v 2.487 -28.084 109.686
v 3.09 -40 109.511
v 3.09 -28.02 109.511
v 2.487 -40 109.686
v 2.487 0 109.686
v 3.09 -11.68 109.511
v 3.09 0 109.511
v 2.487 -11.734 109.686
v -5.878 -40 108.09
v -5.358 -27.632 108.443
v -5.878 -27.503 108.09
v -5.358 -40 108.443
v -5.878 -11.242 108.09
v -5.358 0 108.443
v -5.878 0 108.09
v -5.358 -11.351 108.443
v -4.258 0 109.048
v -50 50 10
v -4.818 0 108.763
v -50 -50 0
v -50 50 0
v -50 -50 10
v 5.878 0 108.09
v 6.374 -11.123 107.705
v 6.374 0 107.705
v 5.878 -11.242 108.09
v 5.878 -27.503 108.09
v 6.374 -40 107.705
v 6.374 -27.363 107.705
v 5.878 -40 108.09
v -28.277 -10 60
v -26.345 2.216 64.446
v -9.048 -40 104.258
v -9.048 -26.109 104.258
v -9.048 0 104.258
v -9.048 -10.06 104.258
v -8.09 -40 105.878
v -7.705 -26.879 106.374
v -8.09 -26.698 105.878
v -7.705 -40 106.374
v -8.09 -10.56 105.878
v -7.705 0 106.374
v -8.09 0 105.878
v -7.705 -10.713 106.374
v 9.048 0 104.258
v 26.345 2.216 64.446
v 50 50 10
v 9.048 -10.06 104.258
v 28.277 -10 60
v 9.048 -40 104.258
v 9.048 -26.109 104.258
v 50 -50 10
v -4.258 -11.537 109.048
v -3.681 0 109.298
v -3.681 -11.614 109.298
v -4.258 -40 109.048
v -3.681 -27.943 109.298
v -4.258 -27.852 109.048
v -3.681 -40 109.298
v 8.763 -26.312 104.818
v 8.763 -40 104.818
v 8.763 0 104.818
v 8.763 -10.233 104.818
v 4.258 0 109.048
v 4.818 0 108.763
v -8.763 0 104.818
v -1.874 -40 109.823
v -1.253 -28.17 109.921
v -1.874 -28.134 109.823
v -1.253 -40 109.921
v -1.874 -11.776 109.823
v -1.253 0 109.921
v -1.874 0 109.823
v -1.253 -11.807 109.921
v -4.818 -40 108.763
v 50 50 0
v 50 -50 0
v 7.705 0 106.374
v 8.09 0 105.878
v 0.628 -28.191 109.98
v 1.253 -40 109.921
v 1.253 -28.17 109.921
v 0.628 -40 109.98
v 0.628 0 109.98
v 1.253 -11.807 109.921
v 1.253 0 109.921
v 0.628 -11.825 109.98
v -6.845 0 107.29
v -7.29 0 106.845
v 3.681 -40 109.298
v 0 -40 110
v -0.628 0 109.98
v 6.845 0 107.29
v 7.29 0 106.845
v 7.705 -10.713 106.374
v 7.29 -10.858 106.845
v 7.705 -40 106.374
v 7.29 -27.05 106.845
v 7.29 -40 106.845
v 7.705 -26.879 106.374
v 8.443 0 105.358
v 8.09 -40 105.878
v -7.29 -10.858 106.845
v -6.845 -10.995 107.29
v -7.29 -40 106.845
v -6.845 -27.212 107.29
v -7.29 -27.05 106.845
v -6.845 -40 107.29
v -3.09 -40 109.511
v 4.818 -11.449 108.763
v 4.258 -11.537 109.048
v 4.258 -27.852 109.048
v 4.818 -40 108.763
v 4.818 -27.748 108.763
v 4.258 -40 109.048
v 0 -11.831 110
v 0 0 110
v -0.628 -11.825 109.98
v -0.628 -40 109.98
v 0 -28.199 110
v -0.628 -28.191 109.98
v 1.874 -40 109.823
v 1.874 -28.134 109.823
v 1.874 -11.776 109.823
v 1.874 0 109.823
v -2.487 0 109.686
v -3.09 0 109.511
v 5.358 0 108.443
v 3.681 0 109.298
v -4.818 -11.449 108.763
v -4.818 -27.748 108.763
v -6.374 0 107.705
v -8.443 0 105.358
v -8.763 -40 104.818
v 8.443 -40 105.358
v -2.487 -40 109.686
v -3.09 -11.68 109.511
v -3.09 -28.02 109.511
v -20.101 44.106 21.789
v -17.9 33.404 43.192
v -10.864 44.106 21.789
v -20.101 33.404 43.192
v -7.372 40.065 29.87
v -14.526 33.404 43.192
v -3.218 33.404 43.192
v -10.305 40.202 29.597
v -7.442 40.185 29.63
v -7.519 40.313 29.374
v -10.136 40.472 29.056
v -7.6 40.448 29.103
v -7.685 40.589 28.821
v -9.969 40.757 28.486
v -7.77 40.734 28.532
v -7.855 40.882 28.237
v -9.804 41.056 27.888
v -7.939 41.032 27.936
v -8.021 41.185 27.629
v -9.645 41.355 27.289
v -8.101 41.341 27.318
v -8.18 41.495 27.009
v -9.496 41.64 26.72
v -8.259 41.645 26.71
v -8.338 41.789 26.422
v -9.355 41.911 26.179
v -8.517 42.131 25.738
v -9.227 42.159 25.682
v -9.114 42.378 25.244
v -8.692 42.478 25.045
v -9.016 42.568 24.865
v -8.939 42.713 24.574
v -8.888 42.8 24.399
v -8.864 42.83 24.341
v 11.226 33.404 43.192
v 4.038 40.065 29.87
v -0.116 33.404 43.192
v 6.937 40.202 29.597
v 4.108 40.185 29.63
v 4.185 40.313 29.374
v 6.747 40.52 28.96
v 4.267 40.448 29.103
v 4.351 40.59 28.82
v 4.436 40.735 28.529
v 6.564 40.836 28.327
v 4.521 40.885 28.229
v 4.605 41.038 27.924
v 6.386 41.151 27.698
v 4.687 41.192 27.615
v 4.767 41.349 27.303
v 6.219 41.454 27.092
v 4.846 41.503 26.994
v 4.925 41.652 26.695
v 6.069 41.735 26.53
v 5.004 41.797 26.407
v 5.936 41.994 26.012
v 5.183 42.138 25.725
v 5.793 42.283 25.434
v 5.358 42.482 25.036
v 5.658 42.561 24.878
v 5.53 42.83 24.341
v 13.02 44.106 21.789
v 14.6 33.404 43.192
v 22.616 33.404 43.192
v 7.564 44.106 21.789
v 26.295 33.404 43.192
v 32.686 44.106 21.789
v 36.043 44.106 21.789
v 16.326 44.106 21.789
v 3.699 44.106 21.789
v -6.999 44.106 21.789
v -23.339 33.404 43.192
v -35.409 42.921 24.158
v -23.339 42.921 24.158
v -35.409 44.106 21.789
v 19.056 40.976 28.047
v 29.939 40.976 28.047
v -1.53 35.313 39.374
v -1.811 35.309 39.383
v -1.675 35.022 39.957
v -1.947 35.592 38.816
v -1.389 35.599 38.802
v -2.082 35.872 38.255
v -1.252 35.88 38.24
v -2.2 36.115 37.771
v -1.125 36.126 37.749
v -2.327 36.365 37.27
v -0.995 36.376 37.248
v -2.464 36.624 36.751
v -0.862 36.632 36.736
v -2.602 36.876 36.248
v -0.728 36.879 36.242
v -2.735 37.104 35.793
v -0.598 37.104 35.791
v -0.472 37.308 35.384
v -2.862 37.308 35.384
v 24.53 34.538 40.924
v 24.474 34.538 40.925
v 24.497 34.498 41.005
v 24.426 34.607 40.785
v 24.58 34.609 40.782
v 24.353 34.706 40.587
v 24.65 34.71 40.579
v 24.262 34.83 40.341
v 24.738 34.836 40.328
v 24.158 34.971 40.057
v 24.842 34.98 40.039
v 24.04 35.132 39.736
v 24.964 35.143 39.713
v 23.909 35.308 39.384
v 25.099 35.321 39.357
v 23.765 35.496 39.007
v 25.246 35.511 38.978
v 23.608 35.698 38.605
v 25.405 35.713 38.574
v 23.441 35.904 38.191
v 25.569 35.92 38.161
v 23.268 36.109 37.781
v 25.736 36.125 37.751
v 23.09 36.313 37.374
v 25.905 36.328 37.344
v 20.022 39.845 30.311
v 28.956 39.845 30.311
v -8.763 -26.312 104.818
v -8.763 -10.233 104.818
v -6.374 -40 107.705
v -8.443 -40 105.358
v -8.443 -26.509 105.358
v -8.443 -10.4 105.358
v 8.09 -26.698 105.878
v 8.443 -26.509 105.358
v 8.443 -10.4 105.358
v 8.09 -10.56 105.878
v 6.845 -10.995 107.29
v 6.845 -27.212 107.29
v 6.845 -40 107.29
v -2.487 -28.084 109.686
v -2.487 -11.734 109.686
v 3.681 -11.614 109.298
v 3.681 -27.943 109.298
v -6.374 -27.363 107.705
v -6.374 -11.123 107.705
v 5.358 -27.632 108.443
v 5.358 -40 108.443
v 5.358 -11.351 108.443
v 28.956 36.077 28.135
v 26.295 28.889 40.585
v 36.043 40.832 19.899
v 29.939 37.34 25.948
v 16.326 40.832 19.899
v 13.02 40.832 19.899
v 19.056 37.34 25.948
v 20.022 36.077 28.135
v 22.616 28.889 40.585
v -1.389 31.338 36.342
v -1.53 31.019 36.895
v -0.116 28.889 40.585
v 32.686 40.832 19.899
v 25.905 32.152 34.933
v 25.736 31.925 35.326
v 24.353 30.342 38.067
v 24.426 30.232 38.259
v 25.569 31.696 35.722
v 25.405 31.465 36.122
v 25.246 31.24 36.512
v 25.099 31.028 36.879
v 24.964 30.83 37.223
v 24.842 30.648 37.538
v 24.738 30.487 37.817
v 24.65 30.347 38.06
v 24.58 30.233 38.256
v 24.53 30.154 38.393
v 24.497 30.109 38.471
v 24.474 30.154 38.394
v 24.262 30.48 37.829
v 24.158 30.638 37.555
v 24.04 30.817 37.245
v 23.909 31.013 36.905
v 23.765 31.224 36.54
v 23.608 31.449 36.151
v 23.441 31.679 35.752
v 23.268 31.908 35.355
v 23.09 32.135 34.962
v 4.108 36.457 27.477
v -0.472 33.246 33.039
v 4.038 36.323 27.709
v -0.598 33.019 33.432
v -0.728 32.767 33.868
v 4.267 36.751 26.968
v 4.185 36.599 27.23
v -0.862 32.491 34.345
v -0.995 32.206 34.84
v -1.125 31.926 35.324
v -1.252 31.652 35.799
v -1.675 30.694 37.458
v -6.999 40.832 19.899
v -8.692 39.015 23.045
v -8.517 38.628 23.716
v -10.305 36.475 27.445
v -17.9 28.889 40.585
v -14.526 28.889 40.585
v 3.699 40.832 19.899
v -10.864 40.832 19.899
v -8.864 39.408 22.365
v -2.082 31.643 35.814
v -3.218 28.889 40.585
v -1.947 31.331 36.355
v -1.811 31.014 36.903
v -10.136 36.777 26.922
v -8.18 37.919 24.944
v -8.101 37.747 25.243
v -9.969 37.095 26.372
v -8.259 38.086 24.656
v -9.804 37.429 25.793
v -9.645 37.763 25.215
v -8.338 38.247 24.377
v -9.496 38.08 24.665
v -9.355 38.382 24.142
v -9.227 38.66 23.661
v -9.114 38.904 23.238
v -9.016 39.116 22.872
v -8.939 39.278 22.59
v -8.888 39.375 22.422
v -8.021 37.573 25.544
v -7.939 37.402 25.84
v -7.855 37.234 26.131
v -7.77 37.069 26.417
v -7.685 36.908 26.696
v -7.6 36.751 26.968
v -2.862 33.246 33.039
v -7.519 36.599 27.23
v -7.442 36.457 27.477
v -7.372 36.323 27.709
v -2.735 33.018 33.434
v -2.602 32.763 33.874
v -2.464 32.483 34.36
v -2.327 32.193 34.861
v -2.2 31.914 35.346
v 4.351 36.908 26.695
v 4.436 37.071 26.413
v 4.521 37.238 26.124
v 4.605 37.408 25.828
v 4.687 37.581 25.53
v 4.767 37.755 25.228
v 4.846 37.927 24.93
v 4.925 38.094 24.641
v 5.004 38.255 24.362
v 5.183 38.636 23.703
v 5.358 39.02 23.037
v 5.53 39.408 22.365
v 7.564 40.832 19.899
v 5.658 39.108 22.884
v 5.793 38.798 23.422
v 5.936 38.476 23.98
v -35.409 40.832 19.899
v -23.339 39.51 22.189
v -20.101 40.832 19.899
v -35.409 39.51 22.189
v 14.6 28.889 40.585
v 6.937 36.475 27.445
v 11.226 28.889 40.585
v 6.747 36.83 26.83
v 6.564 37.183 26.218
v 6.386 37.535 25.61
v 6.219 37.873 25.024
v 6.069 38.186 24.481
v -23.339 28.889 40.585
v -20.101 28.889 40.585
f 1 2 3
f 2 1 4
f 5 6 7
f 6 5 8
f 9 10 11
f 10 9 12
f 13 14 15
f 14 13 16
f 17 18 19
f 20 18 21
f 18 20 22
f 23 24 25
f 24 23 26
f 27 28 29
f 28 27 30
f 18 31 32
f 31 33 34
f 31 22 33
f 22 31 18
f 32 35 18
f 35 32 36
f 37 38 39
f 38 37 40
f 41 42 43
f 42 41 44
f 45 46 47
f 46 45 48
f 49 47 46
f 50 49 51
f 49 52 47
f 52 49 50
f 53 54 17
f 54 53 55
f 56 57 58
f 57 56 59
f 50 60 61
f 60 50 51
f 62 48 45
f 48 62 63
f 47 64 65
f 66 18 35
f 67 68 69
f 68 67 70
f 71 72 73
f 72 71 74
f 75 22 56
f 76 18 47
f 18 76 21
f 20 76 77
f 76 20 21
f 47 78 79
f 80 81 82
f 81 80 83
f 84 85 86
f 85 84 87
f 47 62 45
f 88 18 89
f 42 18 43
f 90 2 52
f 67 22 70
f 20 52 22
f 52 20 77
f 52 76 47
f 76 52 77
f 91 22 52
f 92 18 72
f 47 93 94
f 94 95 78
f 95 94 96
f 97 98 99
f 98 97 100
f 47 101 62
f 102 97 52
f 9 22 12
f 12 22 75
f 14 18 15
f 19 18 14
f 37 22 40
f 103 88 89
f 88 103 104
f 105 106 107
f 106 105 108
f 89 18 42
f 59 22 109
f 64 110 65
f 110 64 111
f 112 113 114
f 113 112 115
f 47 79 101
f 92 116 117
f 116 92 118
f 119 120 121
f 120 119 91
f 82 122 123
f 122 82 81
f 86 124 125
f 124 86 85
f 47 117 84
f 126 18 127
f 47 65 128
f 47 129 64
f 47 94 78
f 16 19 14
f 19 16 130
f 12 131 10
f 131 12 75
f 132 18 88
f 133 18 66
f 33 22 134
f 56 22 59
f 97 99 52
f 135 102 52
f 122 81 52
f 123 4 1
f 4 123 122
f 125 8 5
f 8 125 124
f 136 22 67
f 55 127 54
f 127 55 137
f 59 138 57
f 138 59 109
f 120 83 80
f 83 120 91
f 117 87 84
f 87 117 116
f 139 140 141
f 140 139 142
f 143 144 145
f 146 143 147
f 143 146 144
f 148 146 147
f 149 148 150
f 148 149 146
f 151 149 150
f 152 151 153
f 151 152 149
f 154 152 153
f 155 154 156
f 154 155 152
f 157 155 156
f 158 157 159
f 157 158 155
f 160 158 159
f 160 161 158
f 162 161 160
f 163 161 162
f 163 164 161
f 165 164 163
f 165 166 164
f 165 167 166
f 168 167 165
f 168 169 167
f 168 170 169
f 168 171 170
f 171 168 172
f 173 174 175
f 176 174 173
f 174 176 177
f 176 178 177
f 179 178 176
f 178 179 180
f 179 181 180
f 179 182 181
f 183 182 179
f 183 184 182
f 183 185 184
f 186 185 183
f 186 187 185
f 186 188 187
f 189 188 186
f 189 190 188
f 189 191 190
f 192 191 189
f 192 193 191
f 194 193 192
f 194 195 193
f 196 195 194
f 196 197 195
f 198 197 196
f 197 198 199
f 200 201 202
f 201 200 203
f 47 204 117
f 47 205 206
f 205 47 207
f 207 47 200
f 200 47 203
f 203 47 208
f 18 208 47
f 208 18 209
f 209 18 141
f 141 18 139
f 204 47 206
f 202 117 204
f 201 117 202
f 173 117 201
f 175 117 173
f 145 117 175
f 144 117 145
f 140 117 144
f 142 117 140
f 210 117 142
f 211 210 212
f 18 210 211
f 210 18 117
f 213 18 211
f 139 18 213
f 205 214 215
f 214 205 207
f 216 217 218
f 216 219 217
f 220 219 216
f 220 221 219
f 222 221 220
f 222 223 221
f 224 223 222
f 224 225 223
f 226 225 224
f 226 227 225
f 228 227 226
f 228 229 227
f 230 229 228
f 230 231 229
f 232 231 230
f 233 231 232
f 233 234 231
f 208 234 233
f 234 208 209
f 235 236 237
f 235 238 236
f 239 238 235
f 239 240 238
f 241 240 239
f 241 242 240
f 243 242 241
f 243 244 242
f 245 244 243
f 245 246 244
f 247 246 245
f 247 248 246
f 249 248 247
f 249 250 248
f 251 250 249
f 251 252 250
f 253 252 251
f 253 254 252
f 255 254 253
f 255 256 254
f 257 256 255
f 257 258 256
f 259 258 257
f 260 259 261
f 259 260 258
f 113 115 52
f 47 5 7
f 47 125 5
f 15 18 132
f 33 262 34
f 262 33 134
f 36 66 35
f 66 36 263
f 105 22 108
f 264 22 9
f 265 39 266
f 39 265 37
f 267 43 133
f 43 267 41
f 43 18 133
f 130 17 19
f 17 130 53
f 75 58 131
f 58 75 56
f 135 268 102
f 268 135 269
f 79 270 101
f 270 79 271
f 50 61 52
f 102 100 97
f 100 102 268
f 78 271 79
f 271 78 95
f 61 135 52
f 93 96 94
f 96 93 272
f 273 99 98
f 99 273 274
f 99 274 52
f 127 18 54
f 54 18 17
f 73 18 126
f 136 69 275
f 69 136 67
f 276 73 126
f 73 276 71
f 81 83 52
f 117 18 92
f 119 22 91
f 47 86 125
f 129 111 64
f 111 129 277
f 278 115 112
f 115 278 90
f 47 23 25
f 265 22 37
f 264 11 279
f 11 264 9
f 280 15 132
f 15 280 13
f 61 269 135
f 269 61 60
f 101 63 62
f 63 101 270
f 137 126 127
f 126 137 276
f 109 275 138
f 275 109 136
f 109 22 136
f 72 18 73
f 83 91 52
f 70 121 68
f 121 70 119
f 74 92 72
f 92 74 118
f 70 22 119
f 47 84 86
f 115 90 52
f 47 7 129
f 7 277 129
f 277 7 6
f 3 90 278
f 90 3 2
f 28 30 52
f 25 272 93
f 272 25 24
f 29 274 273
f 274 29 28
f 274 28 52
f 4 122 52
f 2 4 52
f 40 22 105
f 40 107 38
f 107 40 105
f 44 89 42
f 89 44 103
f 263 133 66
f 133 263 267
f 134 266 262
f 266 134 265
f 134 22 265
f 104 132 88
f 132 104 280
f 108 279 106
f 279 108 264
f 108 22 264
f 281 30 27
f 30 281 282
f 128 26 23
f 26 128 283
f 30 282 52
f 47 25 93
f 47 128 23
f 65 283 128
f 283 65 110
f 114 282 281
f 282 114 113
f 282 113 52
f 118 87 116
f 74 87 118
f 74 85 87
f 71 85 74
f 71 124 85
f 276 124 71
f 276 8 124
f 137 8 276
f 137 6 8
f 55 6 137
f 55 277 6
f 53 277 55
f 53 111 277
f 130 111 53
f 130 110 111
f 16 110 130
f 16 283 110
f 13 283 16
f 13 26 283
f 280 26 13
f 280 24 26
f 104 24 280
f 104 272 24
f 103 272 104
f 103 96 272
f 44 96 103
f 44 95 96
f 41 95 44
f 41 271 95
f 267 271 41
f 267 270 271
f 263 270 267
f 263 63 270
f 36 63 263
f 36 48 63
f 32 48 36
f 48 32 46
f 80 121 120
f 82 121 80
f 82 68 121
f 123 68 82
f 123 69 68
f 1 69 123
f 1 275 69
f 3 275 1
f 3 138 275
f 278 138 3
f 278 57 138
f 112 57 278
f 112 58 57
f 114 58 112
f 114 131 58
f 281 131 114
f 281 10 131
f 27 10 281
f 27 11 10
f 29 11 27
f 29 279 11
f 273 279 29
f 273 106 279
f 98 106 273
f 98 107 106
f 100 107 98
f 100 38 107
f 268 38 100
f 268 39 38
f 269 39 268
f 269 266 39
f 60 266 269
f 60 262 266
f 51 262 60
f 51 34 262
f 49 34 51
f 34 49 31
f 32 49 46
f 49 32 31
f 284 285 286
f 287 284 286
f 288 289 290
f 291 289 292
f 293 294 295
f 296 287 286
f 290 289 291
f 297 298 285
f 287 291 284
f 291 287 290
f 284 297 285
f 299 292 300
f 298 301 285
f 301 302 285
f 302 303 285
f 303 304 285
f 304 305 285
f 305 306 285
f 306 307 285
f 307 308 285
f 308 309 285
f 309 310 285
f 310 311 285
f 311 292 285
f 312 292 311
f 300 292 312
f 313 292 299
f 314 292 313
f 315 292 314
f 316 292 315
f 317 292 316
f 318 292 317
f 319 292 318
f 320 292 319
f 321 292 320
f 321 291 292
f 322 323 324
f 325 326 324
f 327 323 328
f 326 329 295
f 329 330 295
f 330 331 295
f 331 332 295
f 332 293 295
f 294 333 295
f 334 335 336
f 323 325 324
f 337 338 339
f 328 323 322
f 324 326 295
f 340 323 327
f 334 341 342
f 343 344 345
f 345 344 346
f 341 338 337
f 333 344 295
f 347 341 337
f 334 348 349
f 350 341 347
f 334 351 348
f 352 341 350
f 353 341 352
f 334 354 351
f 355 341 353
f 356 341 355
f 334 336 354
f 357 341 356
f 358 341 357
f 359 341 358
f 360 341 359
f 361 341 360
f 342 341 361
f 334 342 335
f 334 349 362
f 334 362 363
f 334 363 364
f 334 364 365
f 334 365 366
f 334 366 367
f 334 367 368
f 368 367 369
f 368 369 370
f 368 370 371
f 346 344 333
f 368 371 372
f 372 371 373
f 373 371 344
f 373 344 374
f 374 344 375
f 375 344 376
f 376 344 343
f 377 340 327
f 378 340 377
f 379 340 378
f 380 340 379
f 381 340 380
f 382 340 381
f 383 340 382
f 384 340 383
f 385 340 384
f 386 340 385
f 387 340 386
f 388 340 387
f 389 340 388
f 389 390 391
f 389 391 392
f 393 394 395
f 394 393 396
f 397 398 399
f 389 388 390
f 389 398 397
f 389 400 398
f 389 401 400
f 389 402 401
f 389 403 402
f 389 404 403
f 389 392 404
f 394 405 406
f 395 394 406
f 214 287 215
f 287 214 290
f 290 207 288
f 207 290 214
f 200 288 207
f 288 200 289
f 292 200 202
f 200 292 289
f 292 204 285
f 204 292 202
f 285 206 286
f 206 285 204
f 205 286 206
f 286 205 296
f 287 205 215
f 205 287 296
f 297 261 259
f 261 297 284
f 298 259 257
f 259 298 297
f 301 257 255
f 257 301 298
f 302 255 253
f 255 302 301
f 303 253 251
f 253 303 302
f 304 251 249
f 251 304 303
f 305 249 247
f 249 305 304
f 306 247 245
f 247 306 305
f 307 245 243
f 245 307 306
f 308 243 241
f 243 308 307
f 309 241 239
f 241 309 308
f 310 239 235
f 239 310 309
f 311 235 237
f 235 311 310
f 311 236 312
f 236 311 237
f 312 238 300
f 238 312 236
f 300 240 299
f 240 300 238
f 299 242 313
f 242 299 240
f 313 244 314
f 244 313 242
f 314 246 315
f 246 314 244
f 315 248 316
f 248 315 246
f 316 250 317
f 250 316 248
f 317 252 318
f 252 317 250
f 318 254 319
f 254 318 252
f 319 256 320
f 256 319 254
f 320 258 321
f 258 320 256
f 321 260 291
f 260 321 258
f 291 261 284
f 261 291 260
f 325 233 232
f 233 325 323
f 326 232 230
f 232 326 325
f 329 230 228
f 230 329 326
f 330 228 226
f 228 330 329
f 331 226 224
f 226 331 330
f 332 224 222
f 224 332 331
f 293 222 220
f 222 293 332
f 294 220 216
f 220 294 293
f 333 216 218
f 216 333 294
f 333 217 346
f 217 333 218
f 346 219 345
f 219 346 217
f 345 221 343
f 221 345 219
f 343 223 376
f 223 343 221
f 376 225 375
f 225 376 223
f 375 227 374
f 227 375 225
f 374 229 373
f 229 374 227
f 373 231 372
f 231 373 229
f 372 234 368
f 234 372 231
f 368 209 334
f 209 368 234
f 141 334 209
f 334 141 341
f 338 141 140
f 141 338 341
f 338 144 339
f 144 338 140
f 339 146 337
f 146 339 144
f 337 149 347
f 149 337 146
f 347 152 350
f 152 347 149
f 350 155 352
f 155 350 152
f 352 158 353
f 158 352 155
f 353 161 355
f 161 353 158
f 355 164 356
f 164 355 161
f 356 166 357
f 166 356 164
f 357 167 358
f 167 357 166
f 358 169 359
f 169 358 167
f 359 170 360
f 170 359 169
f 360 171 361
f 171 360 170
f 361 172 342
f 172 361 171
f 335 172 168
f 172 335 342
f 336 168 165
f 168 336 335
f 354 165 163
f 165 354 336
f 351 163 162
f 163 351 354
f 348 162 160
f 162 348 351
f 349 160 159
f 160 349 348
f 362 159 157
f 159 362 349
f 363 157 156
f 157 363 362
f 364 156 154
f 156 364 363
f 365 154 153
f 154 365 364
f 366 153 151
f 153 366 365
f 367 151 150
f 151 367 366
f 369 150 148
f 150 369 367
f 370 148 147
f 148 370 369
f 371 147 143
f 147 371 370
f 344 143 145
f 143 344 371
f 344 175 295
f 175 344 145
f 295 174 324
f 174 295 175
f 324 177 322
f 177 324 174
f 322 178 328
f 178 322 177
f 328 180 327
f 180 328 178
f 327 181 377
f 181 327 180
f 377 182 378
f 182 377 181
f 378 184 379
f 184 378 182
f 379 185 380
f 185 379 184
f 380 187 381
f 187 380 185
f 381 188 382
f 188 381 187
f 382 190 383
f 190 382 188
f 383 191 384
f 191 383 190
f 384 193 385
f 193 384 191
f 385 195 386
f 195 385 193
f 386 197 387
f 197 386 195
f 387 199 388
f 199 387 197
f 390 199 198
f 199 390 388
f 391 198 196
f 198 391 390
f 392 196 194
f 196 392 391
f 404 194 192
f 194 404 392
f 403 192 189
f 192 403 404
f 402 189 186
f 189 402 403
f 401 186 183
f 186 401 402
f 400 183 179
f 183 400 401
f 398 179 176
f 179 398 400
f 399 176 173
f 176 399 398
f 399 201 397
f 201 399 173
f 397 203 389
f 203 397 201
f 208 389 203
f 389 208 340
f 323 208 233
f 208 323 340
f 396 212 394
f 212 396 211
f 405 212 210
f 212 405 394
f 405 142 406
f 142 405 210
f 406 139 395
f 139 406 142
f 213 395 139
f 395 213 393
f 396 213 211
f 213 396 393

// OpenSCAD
$fn = 100;

difference(){
	
	hull(){
		translate([0,0, 100])
			rotate([90, 0, 0])
			cylinder(40, 10, 10);
		
		linear_extrude(10)
			square(100, 100, center=true);
	}
	
	translate([-40,-10,60])
	rotate([90, -20, 90])
	linear_extrude(100)
	polygon([
		[0,0],
		[13,0],
		[16, 60],
		[0, 60]

	]);
	
	translate([0,35,30])
	rotate([60,0,180])
	linear_extrude(height = 10) {
		text("AWL", size = 25, font="Liberation Sans", halign = "center", valign = "center", $fn = 16);
	}
}
